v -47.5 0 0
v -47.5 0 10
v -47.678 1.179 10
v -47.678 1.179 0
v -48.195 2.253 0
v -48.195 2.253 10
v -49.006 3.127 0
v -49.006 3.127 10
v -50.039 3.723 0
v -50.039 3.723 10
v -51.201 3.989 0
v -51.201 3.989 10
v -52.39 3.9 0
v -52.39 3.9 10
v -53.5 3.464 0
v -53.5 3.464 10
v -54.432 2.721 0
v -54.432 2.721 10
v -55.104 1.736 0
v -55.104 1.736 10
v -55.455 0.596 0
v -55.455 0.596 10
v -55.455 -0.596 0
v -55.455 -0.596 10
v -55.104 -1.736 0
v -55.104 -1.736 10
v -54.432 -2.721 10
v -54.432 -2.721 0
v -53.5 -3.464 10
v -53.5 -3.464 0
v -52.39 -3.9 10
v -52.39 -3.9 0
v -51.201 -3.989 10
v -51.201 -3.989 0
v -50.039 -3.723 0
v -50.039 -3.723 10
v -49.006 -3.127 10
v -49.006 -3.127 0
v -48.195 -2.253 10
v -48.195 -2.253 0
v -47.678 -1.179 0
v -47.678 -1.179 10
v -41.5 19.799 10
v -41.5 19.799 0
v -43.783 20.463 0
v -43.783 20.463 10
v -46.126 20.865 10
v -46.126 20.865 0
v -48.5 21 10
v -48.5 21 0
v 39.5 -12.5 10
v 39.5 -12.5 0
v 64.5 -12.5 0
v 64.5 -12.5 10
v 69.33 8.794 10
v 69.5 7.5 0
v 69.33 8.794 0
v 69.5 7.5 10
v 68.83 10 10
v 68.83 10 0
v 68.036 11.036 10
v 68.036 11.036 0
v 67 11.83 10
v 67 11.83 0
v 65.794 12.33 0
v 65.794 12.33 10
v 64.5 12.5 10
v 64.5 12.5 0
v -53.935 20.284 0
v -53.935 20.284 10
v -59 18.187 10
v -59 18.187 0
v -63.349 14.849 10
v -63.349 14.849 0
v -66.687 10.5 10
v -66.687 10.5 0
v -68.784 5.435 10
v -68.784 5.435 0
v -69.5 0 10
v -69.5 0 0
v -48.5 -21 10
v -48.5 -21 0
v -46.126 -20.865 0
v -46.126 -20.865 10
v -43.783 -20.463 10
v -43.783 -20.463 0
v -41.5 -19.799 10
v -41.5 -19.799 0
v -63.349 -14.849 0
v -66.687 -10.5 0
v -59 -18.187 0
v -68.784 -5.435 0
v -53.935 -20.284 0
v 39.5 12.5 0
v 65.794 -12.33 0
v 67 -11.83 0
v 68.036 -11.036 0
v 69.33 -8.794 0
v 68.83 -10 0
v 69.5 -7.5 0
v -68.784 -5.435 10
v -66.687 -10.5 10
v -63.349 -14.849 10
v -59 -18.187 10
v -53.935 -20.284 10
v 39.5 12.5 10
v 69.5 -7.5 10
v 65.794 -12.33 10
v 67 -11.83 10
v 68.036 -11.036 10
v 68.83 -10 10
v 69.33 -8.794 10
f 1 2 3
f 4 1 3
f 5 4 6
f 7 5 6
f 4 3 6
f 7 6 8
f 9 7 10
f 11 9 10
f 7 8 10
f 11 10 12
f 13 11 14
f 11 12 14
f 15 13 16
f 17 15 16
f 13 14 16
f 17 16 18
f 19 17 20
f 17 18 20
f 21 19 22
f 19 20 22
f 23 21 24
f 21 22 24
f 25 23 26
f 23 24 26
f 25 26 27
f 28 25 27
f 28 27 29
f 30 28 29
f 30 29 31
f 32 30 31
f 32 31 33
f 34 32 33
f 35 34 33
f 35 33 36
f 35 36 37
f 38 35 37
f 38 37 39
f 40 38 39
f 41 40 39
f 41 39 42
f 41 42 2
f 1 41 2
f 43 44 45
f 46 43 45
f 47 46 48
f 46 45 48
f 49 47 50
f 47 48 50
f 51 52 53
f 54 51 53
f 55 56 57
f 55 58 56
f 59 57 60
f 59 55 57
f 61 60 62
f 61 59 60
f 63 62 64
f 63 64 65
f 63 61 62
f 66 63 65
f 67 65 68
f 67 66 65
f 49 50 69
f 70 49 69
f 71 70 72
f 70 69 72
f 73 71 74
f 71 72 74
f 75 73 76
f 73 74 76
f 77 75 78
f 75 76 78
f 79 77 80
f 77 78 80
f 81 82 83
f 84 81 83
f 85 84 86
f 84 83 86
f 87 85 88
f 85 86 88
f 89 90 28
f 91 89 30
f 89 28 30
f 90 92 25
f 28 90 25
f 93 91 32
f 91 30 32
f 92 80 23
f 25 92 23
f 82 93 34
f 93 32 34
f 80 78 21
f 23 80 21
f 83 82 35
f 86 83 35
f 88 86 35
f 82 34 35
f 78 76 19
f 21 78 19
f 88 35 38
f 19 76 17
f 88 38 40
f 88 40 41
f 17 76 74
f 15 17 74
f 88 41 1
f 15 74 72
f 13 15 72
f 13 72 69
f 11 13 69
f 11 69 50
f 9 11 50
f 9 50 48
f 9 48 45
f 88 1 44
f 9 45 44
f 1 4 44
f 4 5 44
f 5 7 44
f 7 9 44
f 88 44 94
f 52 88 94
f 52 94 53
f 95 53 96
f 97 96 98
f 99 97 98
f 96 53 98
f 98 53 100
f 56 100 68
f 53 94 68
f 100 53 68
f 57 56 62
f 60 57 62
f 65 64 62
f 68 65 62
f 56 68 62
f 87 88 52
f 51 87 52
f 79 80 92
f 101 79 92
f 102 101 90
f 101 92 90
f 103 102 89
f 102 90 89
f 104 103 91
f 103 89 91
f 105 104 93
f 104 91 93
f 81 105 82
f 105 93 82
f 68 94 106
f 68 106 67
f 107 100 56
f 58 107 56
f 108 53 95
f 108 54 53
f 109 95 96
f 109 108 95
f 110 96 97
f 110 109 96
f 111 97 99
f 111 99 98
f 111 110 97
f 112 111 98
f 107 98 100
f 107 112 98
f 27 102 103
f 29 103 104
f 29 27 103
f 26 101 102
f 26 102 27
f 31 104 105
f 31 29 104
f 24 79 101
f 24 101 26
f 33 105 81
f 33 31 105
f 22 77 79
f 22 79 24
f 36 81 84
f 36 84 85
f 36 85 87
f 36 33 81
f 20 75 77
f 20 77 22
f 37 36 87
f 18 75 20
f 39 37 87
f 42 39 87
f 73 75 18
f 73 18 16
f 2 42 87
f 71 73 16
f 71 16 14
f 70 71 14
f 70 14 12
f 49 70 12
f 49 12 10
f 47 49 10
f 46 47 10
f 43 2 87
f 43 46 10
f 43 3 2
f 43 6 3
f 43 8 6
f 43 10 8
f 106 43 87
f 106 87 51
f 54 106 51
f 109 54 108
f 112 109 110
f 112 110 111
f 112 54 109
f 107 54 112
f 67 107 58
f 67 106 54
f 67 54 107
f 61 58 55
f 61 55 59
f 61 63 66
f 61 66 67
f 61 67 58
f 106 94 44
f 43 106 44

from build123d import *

# Parameters (mm, degrees)
SKETCH_1_W          = 30
SKETCH_1_H          = 25
EXTRUDE_1_DEPTH     = 10
FILLET_1_R          = 5
SKETCH_2_R          = 4
CUT_EXTRUDE_1_DEPTH = 14


with BuildPart() as part:
    # 草图1 → 凸台-拉伸1 (new body)
    with BuildSketch(Plane.XY):
        with BuildLine():
            ThreePointArc((-27.5, 0), (-31.353571801, 12.124355653), (-41.5, 19.798989873))
            ThreePointArc((-41.5, 19.798989873), (-44.948858447, 20.697569753), (-48.5, 21))
            ThreePointArc((-48.5, 21), (-63.349242405, 14.849242405), (-69.5, 0))
            ThreePointArc((-69.5, 0), (-63.349242405, -14.849242405), (-48.5, -21))
            ThreePointArc((-48.5, -21), (-44.948858447, -20.697569753), (-41.5, -19.798989873))
            ThreePointArc((-41.5, -19.798989873), (-31.353571801, -12.124355653), (-27.5, 0))
        make_face()
        with BuildLine():
            Line((39.5, 12.5), (-41.5, 19.798989873))
            ThreePointArc((-41.5, 19.798989873), (-31.353571801, 12.124355653), (-27.5, 0))
            ThreePointArc((-27.5, 0), (-31.353571801, -12.124355653), (-41.5, -19.798989873))
            Line((-41.5, -19.798989873), (39.5, -12.5))
            Line((39.5, -12.5), (39.5, 12.5))
        make_face()
        with Locations((54.5, 0)):
            Rectangle(SKETCH_1_W, SKETCH_1_H)
    extrude(amount=EXTRUDE_1_DEPTH)

    # 圆角1
    fillet_1_edges = [part.edges().sort_by_distance(p)[0] for p in [
        (69.5, 12.5, 5),
        (69.5, -12.5, 5),
    ]]
    fillet(fillet_1_edges, radius=FILLET_1_R)

    # 草图2 → 切除-拉伸1 (cut)
    with BuildSketch(Plane.XY.offset(10)):
        with Locations((-51.5, 0)):
            Circle(SKETCH_2_R)
    extrude(amount=-CUT_EXTRUDE_1_DEPTH, mode=Mode.SUBTRACT)


solid = part.part
